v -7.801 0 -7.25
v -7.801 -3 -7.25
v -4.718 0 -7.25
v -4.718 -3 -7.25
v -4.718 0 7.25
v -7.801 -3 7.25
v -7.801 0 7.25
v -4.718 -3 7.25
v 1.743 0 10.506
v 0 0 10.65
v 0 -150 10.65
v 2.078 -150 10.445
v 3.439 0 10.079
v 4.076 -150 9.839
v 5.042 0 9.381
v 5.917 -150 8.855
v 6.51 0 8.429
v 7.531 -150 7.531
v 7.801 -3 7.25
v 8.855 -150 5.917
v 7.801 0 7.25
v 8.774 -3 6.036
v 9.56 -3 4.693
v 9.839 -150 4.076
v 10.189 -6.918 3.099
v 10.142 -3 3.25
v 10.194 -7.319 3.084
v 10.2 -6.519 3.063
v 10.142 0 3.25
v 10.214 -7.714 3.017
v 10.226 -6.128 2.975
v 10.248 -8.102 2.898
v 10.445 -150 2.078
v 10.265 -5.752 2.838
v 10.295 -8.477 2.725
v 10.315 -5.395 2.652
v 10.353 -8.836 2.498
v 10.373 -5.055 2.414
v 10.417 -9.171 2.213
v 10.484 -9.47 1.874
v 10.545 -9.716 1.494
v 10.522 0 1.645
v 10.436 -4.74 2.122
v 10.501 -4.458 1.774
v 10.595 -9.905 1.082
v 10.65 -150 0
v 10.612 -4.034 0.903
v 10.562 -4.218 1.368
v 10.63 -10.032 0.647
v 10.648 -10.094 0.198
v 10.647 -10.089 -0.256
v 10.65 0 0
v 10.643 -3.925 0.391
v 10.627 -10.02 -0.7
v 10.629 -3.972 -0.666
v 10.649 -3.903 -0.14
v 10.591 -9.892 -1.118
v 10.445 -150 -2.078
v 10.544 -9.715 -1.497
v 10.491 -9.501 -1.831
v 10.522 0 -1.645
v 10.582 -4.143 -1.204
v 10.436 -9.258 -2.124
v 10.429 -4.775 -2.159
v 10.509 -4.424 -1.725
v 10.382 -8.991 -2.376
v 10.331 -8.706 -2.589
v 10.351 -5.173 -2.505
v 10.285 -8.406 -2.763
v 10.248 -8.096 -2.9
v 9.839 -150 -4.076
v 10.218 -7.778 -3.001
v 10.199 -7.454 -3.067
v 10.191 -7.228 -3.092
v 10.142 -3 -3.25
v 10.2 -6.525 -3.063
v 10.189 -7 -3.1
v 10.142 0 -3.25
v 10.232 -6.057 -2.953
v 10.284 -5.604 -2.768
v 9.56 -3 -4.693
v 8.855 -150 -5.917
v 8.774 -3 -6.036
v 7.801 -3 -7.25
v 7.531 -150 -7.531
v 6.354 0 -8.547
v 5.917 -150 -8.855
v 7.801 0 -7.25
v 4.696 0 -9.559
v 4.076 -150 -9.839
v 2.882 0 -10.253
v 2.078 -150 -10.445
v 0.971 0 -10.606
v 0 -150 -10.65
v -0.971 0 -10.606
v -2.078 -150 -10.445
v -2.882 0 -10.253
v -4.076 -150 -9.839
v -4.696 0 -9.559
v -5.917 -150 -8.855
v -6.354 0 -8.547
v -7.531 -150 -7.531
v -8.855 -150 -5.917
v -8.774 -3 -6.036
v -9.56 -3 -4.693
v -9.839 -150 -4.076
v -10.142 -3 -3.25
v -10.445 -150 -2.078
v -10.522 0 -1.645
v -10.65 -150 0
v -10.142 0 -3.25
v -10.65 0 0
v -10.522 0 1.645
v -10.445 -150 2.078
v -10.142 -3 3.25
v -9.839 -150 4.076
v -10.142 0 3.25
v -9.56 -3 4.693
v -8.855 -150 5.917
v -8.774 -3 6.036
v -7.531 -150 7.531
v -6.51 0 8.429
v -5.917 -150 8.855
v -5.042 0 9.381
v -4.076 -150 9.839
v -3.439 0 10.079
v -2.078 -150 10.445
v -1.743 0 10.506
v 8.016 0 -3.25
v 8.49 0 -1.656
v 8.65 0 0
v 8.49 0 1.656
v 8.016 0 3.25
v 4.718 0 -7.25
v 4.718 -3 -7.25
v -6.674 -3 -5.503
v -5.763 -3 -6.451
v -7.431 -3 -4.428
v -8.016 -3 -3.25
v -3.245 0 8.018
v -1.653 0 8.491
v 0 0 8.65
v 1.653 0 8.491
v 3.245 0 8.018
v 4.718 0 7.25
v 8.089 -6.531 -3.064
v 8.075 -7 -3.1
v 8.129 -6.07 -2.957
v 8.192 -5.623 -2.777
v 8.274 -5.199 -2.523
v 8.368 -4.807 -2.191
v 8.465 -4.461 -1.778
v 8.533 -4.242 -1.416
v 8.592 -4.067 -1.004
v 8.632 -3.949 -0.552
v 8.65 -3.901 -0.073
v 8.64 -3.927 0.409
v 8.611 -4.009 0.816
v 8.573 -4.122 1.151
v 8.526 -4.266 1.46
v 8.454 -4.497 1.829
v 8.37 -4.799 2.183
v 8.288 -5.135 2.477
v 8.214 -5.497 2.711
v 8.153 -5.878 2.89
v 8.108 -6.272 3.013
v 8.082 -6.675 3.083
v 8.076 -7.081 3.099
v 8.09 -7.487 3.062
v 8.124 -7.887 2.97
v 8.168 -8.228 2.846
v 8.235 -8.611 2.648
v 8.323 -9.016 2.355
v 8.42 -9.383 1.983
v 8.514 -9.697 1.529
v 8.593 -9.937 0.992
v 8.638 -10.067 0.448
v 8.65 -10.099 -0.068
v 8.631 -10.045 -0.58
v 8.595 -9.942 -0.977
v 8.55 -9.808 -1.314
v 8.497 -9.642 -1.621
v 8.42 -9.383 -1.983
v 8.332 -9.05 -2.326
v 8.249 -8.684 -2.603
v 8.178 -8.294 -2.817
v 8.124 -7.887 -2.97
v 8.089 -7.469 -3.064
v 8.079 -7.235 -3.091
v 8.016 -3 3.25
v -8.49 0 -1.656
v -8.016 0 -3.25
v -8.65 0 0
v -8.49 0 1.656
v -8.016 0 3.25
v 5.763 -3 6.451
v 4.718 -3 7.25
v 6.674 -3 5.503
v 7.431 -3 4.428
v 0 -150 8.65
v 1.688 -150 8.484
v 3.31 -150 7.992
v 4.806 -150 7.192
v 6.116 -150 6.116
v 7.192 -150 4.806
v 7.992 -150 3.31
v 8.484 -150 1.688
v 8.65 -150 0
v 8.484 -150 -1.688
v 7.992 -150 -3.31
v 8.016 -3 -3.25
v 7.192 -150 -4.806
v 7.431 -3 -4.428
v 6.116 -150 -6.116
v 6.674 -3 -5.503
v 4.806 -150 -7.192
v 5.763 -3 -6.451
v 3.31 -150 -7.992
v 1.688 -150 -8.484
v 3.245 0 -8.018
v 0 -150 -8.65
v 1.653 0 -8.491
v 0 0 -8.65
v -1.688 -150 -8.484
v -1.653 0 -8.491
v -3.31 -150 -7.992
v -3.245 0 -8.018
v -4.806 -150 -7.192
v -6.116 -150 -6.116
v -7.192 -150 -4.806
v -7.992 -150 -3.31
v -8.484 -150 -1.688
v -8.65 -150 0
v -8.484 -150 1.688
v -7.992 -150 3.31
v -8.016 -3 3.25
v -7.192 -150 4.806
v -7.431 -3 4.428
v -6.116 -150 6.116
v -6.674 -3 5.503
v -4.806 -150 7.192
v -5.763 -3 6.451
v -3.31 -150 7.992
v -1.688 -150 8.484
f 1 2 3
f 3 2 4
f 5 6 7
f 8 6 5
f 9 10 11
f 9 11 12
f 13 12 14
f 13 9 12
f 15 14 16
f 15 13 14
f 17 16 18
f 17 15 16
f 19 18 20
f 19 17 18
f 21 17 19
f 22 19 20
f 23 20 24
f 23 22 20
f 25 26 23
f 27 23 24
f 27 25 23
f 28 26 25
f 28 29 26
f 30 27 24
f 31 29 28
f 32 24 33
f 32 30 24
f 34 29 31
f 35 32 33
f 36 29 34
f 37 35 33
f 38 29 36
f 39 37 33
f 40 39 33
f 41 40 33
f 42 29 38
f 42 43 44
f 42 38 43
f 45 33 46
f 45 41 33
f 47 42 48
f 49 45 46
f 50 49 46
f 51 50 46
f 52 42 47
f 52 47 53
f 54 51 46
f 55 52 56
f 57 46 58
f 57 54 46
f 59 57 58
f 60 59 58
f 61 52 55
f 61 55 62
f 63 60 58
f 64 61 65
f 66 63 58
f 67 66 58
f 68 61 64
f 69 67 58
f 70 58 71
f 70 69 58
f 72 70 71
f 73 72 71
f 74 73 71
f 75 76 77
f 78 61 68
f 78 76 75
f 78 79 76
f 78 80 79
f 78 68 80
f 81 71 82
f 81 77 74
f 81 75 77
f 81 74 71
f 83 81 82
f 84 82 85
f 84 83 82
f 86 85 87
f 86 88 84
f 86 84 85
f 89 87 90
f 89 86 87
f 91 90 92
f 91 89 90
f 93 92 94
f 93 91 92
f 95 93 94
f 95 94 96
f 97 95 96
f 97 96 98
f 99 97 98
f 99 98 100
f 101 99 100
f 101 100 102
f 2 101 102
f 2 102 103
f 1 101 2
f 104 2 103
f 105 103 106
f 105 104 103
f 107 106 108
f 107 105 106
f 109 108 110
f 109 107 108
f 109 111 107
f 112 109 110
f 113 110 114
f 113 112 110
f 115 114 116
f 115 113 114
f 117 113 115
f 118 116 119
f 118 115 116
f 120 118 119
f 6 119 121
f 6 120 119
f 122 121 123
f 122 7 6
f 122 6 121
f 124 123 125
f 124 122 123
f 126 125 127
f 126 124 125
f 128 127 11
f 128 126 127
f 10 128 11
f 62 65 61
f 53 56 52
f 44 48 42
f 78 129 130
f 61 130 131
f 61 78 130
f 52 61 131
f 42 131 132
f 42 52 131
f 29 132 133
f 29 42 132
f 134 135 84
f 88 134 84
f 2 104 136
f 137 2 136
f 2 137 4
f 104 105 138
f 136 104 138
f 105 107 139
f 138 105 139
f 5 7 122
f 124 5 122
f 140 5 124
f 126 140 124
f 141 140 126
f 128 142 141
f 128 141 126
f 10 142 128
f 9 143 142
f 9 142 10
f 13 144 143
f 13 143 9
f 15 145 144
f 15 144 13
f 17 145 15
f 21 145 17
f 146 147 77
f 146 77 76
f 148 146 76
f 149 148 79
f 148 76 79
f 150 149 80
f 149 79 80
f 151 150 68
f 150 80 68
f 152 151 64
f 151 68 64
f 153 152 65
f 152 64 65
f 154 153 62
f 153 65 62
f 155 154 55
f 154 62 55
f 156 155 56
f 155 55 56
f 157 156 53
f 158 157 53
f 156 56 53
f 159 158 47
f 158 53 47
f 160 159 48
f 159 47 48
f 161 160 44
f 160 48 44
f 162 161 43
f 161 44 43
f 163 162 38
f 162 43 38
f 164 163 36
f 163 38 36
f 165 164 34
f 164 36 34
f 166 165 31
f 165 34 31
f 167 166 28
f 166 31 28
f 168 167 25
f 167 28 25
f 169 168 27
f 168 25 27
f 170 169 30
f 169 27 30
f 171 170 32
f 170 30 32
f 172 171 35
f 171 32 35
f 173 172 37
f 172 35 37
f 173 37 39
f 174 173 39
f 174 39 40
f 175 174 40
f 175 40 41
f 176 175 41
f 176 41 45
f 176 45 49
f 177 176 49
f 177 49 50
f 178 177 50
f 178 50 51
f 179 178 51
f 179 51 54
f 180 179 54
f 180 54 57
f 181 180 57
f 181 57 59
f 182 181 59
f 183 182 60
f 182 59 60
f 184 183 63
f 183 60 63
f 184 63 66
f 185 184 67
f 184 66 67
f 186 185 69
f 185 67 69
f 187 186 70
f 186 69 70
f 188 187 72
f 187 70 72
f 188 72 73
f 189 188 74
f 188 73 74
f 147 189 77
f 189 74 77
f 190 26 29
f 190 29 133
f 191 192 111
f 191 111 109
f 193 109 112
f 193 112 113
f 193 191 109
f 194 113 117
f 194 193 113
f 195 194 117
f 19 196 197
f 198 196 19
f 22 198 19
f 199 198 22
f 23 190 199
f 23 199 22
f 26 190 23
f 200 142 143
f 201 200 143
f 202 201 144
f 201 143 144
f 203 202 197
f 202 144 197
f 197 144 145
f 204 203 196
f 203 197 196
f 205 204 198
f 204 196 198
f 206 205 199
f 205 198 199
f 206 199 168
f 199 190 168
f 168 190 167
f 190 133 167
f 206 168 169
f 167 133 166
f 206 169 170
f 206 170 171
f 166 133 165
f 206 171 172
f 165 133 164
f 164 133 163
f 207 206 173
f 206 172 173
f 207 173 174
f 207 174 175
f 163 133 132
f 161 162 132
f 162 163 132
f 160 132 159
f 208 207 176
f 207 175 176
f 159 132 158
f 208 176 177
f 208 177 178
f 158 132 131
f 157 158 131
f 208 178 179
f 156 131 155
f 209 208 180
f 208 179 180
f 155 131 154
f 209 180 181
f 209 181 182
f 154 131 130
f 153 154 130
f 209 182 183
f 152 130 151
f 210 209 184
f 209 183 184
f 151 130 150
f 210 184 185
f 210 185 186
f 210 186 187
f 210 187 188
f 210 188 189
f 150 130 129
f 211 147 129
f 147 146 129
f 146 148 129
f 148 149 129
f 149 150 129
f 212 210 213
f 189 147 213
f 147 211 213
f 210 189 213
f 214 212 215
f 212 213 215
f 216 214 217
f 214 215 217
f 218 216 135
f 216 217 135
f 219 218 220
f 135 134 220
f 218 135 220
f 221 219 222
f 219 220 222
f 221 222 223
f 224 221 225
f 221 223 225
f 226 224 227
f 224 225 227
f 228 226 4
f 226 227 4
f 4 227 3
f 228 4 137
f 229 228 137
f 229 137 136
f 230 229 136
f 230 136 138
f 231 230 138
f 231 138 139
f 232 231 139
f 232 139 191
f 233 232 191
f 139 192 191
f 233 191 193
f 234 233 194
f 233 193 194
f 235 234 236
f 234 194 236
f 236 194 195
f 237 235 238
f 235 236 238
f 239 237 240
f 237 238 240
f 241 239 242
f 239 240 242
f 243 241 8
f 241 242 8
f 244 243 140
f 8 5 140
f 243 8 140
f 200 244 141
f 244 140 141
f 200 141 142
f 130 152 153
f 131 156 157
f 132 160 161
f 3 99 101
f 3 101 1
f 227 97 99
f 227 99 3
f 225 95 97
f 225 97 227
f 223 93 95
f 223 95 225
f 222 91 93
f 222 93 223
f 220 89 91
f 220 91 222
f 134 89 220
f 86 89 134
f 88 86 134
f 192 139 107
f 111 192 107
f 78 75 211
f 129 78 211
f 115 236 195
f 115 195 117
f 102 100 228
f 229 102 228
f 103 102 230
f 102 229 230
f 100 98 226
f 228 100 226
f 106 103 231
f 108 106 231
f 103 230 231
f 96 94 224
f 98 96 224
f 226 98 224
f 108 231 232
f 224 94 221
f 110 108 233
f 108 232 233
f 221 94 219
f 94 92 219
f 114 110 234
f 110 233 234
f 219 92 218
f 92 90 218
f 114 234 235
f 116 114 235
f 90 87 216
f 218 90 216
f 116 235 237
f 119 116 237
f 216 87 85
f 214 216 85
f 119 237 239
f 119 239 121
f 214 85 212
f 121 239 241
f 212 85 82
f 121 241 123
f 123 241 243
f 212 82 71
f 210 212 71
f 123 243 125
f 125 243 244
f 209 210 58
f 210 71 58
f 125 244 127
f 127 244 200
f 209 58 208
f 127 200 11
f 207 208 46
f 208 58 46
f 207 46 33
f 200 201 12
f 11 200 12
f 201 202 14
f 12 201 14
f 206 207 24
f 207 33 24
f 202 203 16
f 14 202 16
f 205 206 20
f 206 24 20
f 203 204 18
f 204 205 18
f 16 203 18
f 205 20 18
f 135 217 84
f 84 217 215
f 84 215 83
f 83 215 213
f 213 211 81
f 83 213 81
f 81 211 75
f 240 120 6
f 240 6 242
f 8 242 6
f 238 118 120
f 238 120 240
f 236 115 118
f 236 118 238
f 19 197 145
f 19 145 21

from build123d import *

# Parameters (mm, degrees)
SKETCH_1_R          = 10.65
SKETCH_1_R_2        = 8.65
EXTRUDE_1_DEPTH     = 150
SKETCH_2_R          = 3.1
CUT_EXTRUDE_1_DEPTH = 5
OTHER_START         = -3
OTHER_1_DEPTH       = 3


# Read off the part's stored shape, not the designer's step: Полость1
with BuildPart() as part:
    # Эскиз1 → Бобышка-Вытянуть1 (new body)
    with BuildSketch(Plane(origin=(0, 0, 0), x_dir=(1, 0, 0), z_dir=(0, 1, 0))):
        with Locations(Location((0, 0, 0), (0, 0, 270))):
            Circle(SKETCH_1_R)
        with Locations(Location((0, 0, 0), (0, 0, 270))):
            Circle(SKETCH_1_R_2, mode=Mode.SUBTRACT)
    extrude(amount=-EXTRUDE_1_DEPTH)

    # Эскиз2 → Вырез-Вытянуть1 (cut, symmetric)
    with BuildSketch(Plane(origin=(8.65, 0, 0), x_dir=(0, 0, -1), z_dir=(1, 0, 0))):
        with Locations((0, -7)):
            Circle(SKETCH_2_R)
    extrude(amount=CUT_EXTRUDE_1_DEPTH, both=True, mode=Mode.SUBTRACT)

    # Полость1 outline → Полость1 (cut)
    with BuildSketch(Plane(origin=(0, 0, 0), x_dir=(1, 0, 0), z_dir=(0, 1, 0)).offset(OTHER_START)):
        with BuildLine():
            Line((10.141991915, -3.25), (8.01623353, -3.25))
            ThreePointArc((8.01623353, -3.25), (6.673866727, -5.502908587), (4.718050445, -7.25))
            Line((4.718050445, -7.25), (7.801281946, -7.25))
            ThreePointArc((7.801281946, -7.25), (9.191858855, -5.378868914), (10.141991915, -3.25))
        make_face()
        with BuildLine():
            Line((-7.801281946, -7.25), (-4.718050445, -7.25))
            ThreePointArc((-4.718050445, -7.25), (-6.673866727, -5.502908587), (-8.01623353, -3.25))
            Line((-8.01623353, -3.25), (-10.141991915, -3.25))
            ThreePointArc((-10.141991915, -3.25), (-9.191858855, -5.378868914), (-7.801281946, -7.25))
        make_face()
    other_1 = extrude(amount=OTHER_1_DEPTH, mode=Mode.SUBTRACT)

    # Зеркальное отражение1: Полость1 across plane
    add(other_1.mirror(Plane.XY), mode=Mode.SUBTRACT)


solid = part.part
